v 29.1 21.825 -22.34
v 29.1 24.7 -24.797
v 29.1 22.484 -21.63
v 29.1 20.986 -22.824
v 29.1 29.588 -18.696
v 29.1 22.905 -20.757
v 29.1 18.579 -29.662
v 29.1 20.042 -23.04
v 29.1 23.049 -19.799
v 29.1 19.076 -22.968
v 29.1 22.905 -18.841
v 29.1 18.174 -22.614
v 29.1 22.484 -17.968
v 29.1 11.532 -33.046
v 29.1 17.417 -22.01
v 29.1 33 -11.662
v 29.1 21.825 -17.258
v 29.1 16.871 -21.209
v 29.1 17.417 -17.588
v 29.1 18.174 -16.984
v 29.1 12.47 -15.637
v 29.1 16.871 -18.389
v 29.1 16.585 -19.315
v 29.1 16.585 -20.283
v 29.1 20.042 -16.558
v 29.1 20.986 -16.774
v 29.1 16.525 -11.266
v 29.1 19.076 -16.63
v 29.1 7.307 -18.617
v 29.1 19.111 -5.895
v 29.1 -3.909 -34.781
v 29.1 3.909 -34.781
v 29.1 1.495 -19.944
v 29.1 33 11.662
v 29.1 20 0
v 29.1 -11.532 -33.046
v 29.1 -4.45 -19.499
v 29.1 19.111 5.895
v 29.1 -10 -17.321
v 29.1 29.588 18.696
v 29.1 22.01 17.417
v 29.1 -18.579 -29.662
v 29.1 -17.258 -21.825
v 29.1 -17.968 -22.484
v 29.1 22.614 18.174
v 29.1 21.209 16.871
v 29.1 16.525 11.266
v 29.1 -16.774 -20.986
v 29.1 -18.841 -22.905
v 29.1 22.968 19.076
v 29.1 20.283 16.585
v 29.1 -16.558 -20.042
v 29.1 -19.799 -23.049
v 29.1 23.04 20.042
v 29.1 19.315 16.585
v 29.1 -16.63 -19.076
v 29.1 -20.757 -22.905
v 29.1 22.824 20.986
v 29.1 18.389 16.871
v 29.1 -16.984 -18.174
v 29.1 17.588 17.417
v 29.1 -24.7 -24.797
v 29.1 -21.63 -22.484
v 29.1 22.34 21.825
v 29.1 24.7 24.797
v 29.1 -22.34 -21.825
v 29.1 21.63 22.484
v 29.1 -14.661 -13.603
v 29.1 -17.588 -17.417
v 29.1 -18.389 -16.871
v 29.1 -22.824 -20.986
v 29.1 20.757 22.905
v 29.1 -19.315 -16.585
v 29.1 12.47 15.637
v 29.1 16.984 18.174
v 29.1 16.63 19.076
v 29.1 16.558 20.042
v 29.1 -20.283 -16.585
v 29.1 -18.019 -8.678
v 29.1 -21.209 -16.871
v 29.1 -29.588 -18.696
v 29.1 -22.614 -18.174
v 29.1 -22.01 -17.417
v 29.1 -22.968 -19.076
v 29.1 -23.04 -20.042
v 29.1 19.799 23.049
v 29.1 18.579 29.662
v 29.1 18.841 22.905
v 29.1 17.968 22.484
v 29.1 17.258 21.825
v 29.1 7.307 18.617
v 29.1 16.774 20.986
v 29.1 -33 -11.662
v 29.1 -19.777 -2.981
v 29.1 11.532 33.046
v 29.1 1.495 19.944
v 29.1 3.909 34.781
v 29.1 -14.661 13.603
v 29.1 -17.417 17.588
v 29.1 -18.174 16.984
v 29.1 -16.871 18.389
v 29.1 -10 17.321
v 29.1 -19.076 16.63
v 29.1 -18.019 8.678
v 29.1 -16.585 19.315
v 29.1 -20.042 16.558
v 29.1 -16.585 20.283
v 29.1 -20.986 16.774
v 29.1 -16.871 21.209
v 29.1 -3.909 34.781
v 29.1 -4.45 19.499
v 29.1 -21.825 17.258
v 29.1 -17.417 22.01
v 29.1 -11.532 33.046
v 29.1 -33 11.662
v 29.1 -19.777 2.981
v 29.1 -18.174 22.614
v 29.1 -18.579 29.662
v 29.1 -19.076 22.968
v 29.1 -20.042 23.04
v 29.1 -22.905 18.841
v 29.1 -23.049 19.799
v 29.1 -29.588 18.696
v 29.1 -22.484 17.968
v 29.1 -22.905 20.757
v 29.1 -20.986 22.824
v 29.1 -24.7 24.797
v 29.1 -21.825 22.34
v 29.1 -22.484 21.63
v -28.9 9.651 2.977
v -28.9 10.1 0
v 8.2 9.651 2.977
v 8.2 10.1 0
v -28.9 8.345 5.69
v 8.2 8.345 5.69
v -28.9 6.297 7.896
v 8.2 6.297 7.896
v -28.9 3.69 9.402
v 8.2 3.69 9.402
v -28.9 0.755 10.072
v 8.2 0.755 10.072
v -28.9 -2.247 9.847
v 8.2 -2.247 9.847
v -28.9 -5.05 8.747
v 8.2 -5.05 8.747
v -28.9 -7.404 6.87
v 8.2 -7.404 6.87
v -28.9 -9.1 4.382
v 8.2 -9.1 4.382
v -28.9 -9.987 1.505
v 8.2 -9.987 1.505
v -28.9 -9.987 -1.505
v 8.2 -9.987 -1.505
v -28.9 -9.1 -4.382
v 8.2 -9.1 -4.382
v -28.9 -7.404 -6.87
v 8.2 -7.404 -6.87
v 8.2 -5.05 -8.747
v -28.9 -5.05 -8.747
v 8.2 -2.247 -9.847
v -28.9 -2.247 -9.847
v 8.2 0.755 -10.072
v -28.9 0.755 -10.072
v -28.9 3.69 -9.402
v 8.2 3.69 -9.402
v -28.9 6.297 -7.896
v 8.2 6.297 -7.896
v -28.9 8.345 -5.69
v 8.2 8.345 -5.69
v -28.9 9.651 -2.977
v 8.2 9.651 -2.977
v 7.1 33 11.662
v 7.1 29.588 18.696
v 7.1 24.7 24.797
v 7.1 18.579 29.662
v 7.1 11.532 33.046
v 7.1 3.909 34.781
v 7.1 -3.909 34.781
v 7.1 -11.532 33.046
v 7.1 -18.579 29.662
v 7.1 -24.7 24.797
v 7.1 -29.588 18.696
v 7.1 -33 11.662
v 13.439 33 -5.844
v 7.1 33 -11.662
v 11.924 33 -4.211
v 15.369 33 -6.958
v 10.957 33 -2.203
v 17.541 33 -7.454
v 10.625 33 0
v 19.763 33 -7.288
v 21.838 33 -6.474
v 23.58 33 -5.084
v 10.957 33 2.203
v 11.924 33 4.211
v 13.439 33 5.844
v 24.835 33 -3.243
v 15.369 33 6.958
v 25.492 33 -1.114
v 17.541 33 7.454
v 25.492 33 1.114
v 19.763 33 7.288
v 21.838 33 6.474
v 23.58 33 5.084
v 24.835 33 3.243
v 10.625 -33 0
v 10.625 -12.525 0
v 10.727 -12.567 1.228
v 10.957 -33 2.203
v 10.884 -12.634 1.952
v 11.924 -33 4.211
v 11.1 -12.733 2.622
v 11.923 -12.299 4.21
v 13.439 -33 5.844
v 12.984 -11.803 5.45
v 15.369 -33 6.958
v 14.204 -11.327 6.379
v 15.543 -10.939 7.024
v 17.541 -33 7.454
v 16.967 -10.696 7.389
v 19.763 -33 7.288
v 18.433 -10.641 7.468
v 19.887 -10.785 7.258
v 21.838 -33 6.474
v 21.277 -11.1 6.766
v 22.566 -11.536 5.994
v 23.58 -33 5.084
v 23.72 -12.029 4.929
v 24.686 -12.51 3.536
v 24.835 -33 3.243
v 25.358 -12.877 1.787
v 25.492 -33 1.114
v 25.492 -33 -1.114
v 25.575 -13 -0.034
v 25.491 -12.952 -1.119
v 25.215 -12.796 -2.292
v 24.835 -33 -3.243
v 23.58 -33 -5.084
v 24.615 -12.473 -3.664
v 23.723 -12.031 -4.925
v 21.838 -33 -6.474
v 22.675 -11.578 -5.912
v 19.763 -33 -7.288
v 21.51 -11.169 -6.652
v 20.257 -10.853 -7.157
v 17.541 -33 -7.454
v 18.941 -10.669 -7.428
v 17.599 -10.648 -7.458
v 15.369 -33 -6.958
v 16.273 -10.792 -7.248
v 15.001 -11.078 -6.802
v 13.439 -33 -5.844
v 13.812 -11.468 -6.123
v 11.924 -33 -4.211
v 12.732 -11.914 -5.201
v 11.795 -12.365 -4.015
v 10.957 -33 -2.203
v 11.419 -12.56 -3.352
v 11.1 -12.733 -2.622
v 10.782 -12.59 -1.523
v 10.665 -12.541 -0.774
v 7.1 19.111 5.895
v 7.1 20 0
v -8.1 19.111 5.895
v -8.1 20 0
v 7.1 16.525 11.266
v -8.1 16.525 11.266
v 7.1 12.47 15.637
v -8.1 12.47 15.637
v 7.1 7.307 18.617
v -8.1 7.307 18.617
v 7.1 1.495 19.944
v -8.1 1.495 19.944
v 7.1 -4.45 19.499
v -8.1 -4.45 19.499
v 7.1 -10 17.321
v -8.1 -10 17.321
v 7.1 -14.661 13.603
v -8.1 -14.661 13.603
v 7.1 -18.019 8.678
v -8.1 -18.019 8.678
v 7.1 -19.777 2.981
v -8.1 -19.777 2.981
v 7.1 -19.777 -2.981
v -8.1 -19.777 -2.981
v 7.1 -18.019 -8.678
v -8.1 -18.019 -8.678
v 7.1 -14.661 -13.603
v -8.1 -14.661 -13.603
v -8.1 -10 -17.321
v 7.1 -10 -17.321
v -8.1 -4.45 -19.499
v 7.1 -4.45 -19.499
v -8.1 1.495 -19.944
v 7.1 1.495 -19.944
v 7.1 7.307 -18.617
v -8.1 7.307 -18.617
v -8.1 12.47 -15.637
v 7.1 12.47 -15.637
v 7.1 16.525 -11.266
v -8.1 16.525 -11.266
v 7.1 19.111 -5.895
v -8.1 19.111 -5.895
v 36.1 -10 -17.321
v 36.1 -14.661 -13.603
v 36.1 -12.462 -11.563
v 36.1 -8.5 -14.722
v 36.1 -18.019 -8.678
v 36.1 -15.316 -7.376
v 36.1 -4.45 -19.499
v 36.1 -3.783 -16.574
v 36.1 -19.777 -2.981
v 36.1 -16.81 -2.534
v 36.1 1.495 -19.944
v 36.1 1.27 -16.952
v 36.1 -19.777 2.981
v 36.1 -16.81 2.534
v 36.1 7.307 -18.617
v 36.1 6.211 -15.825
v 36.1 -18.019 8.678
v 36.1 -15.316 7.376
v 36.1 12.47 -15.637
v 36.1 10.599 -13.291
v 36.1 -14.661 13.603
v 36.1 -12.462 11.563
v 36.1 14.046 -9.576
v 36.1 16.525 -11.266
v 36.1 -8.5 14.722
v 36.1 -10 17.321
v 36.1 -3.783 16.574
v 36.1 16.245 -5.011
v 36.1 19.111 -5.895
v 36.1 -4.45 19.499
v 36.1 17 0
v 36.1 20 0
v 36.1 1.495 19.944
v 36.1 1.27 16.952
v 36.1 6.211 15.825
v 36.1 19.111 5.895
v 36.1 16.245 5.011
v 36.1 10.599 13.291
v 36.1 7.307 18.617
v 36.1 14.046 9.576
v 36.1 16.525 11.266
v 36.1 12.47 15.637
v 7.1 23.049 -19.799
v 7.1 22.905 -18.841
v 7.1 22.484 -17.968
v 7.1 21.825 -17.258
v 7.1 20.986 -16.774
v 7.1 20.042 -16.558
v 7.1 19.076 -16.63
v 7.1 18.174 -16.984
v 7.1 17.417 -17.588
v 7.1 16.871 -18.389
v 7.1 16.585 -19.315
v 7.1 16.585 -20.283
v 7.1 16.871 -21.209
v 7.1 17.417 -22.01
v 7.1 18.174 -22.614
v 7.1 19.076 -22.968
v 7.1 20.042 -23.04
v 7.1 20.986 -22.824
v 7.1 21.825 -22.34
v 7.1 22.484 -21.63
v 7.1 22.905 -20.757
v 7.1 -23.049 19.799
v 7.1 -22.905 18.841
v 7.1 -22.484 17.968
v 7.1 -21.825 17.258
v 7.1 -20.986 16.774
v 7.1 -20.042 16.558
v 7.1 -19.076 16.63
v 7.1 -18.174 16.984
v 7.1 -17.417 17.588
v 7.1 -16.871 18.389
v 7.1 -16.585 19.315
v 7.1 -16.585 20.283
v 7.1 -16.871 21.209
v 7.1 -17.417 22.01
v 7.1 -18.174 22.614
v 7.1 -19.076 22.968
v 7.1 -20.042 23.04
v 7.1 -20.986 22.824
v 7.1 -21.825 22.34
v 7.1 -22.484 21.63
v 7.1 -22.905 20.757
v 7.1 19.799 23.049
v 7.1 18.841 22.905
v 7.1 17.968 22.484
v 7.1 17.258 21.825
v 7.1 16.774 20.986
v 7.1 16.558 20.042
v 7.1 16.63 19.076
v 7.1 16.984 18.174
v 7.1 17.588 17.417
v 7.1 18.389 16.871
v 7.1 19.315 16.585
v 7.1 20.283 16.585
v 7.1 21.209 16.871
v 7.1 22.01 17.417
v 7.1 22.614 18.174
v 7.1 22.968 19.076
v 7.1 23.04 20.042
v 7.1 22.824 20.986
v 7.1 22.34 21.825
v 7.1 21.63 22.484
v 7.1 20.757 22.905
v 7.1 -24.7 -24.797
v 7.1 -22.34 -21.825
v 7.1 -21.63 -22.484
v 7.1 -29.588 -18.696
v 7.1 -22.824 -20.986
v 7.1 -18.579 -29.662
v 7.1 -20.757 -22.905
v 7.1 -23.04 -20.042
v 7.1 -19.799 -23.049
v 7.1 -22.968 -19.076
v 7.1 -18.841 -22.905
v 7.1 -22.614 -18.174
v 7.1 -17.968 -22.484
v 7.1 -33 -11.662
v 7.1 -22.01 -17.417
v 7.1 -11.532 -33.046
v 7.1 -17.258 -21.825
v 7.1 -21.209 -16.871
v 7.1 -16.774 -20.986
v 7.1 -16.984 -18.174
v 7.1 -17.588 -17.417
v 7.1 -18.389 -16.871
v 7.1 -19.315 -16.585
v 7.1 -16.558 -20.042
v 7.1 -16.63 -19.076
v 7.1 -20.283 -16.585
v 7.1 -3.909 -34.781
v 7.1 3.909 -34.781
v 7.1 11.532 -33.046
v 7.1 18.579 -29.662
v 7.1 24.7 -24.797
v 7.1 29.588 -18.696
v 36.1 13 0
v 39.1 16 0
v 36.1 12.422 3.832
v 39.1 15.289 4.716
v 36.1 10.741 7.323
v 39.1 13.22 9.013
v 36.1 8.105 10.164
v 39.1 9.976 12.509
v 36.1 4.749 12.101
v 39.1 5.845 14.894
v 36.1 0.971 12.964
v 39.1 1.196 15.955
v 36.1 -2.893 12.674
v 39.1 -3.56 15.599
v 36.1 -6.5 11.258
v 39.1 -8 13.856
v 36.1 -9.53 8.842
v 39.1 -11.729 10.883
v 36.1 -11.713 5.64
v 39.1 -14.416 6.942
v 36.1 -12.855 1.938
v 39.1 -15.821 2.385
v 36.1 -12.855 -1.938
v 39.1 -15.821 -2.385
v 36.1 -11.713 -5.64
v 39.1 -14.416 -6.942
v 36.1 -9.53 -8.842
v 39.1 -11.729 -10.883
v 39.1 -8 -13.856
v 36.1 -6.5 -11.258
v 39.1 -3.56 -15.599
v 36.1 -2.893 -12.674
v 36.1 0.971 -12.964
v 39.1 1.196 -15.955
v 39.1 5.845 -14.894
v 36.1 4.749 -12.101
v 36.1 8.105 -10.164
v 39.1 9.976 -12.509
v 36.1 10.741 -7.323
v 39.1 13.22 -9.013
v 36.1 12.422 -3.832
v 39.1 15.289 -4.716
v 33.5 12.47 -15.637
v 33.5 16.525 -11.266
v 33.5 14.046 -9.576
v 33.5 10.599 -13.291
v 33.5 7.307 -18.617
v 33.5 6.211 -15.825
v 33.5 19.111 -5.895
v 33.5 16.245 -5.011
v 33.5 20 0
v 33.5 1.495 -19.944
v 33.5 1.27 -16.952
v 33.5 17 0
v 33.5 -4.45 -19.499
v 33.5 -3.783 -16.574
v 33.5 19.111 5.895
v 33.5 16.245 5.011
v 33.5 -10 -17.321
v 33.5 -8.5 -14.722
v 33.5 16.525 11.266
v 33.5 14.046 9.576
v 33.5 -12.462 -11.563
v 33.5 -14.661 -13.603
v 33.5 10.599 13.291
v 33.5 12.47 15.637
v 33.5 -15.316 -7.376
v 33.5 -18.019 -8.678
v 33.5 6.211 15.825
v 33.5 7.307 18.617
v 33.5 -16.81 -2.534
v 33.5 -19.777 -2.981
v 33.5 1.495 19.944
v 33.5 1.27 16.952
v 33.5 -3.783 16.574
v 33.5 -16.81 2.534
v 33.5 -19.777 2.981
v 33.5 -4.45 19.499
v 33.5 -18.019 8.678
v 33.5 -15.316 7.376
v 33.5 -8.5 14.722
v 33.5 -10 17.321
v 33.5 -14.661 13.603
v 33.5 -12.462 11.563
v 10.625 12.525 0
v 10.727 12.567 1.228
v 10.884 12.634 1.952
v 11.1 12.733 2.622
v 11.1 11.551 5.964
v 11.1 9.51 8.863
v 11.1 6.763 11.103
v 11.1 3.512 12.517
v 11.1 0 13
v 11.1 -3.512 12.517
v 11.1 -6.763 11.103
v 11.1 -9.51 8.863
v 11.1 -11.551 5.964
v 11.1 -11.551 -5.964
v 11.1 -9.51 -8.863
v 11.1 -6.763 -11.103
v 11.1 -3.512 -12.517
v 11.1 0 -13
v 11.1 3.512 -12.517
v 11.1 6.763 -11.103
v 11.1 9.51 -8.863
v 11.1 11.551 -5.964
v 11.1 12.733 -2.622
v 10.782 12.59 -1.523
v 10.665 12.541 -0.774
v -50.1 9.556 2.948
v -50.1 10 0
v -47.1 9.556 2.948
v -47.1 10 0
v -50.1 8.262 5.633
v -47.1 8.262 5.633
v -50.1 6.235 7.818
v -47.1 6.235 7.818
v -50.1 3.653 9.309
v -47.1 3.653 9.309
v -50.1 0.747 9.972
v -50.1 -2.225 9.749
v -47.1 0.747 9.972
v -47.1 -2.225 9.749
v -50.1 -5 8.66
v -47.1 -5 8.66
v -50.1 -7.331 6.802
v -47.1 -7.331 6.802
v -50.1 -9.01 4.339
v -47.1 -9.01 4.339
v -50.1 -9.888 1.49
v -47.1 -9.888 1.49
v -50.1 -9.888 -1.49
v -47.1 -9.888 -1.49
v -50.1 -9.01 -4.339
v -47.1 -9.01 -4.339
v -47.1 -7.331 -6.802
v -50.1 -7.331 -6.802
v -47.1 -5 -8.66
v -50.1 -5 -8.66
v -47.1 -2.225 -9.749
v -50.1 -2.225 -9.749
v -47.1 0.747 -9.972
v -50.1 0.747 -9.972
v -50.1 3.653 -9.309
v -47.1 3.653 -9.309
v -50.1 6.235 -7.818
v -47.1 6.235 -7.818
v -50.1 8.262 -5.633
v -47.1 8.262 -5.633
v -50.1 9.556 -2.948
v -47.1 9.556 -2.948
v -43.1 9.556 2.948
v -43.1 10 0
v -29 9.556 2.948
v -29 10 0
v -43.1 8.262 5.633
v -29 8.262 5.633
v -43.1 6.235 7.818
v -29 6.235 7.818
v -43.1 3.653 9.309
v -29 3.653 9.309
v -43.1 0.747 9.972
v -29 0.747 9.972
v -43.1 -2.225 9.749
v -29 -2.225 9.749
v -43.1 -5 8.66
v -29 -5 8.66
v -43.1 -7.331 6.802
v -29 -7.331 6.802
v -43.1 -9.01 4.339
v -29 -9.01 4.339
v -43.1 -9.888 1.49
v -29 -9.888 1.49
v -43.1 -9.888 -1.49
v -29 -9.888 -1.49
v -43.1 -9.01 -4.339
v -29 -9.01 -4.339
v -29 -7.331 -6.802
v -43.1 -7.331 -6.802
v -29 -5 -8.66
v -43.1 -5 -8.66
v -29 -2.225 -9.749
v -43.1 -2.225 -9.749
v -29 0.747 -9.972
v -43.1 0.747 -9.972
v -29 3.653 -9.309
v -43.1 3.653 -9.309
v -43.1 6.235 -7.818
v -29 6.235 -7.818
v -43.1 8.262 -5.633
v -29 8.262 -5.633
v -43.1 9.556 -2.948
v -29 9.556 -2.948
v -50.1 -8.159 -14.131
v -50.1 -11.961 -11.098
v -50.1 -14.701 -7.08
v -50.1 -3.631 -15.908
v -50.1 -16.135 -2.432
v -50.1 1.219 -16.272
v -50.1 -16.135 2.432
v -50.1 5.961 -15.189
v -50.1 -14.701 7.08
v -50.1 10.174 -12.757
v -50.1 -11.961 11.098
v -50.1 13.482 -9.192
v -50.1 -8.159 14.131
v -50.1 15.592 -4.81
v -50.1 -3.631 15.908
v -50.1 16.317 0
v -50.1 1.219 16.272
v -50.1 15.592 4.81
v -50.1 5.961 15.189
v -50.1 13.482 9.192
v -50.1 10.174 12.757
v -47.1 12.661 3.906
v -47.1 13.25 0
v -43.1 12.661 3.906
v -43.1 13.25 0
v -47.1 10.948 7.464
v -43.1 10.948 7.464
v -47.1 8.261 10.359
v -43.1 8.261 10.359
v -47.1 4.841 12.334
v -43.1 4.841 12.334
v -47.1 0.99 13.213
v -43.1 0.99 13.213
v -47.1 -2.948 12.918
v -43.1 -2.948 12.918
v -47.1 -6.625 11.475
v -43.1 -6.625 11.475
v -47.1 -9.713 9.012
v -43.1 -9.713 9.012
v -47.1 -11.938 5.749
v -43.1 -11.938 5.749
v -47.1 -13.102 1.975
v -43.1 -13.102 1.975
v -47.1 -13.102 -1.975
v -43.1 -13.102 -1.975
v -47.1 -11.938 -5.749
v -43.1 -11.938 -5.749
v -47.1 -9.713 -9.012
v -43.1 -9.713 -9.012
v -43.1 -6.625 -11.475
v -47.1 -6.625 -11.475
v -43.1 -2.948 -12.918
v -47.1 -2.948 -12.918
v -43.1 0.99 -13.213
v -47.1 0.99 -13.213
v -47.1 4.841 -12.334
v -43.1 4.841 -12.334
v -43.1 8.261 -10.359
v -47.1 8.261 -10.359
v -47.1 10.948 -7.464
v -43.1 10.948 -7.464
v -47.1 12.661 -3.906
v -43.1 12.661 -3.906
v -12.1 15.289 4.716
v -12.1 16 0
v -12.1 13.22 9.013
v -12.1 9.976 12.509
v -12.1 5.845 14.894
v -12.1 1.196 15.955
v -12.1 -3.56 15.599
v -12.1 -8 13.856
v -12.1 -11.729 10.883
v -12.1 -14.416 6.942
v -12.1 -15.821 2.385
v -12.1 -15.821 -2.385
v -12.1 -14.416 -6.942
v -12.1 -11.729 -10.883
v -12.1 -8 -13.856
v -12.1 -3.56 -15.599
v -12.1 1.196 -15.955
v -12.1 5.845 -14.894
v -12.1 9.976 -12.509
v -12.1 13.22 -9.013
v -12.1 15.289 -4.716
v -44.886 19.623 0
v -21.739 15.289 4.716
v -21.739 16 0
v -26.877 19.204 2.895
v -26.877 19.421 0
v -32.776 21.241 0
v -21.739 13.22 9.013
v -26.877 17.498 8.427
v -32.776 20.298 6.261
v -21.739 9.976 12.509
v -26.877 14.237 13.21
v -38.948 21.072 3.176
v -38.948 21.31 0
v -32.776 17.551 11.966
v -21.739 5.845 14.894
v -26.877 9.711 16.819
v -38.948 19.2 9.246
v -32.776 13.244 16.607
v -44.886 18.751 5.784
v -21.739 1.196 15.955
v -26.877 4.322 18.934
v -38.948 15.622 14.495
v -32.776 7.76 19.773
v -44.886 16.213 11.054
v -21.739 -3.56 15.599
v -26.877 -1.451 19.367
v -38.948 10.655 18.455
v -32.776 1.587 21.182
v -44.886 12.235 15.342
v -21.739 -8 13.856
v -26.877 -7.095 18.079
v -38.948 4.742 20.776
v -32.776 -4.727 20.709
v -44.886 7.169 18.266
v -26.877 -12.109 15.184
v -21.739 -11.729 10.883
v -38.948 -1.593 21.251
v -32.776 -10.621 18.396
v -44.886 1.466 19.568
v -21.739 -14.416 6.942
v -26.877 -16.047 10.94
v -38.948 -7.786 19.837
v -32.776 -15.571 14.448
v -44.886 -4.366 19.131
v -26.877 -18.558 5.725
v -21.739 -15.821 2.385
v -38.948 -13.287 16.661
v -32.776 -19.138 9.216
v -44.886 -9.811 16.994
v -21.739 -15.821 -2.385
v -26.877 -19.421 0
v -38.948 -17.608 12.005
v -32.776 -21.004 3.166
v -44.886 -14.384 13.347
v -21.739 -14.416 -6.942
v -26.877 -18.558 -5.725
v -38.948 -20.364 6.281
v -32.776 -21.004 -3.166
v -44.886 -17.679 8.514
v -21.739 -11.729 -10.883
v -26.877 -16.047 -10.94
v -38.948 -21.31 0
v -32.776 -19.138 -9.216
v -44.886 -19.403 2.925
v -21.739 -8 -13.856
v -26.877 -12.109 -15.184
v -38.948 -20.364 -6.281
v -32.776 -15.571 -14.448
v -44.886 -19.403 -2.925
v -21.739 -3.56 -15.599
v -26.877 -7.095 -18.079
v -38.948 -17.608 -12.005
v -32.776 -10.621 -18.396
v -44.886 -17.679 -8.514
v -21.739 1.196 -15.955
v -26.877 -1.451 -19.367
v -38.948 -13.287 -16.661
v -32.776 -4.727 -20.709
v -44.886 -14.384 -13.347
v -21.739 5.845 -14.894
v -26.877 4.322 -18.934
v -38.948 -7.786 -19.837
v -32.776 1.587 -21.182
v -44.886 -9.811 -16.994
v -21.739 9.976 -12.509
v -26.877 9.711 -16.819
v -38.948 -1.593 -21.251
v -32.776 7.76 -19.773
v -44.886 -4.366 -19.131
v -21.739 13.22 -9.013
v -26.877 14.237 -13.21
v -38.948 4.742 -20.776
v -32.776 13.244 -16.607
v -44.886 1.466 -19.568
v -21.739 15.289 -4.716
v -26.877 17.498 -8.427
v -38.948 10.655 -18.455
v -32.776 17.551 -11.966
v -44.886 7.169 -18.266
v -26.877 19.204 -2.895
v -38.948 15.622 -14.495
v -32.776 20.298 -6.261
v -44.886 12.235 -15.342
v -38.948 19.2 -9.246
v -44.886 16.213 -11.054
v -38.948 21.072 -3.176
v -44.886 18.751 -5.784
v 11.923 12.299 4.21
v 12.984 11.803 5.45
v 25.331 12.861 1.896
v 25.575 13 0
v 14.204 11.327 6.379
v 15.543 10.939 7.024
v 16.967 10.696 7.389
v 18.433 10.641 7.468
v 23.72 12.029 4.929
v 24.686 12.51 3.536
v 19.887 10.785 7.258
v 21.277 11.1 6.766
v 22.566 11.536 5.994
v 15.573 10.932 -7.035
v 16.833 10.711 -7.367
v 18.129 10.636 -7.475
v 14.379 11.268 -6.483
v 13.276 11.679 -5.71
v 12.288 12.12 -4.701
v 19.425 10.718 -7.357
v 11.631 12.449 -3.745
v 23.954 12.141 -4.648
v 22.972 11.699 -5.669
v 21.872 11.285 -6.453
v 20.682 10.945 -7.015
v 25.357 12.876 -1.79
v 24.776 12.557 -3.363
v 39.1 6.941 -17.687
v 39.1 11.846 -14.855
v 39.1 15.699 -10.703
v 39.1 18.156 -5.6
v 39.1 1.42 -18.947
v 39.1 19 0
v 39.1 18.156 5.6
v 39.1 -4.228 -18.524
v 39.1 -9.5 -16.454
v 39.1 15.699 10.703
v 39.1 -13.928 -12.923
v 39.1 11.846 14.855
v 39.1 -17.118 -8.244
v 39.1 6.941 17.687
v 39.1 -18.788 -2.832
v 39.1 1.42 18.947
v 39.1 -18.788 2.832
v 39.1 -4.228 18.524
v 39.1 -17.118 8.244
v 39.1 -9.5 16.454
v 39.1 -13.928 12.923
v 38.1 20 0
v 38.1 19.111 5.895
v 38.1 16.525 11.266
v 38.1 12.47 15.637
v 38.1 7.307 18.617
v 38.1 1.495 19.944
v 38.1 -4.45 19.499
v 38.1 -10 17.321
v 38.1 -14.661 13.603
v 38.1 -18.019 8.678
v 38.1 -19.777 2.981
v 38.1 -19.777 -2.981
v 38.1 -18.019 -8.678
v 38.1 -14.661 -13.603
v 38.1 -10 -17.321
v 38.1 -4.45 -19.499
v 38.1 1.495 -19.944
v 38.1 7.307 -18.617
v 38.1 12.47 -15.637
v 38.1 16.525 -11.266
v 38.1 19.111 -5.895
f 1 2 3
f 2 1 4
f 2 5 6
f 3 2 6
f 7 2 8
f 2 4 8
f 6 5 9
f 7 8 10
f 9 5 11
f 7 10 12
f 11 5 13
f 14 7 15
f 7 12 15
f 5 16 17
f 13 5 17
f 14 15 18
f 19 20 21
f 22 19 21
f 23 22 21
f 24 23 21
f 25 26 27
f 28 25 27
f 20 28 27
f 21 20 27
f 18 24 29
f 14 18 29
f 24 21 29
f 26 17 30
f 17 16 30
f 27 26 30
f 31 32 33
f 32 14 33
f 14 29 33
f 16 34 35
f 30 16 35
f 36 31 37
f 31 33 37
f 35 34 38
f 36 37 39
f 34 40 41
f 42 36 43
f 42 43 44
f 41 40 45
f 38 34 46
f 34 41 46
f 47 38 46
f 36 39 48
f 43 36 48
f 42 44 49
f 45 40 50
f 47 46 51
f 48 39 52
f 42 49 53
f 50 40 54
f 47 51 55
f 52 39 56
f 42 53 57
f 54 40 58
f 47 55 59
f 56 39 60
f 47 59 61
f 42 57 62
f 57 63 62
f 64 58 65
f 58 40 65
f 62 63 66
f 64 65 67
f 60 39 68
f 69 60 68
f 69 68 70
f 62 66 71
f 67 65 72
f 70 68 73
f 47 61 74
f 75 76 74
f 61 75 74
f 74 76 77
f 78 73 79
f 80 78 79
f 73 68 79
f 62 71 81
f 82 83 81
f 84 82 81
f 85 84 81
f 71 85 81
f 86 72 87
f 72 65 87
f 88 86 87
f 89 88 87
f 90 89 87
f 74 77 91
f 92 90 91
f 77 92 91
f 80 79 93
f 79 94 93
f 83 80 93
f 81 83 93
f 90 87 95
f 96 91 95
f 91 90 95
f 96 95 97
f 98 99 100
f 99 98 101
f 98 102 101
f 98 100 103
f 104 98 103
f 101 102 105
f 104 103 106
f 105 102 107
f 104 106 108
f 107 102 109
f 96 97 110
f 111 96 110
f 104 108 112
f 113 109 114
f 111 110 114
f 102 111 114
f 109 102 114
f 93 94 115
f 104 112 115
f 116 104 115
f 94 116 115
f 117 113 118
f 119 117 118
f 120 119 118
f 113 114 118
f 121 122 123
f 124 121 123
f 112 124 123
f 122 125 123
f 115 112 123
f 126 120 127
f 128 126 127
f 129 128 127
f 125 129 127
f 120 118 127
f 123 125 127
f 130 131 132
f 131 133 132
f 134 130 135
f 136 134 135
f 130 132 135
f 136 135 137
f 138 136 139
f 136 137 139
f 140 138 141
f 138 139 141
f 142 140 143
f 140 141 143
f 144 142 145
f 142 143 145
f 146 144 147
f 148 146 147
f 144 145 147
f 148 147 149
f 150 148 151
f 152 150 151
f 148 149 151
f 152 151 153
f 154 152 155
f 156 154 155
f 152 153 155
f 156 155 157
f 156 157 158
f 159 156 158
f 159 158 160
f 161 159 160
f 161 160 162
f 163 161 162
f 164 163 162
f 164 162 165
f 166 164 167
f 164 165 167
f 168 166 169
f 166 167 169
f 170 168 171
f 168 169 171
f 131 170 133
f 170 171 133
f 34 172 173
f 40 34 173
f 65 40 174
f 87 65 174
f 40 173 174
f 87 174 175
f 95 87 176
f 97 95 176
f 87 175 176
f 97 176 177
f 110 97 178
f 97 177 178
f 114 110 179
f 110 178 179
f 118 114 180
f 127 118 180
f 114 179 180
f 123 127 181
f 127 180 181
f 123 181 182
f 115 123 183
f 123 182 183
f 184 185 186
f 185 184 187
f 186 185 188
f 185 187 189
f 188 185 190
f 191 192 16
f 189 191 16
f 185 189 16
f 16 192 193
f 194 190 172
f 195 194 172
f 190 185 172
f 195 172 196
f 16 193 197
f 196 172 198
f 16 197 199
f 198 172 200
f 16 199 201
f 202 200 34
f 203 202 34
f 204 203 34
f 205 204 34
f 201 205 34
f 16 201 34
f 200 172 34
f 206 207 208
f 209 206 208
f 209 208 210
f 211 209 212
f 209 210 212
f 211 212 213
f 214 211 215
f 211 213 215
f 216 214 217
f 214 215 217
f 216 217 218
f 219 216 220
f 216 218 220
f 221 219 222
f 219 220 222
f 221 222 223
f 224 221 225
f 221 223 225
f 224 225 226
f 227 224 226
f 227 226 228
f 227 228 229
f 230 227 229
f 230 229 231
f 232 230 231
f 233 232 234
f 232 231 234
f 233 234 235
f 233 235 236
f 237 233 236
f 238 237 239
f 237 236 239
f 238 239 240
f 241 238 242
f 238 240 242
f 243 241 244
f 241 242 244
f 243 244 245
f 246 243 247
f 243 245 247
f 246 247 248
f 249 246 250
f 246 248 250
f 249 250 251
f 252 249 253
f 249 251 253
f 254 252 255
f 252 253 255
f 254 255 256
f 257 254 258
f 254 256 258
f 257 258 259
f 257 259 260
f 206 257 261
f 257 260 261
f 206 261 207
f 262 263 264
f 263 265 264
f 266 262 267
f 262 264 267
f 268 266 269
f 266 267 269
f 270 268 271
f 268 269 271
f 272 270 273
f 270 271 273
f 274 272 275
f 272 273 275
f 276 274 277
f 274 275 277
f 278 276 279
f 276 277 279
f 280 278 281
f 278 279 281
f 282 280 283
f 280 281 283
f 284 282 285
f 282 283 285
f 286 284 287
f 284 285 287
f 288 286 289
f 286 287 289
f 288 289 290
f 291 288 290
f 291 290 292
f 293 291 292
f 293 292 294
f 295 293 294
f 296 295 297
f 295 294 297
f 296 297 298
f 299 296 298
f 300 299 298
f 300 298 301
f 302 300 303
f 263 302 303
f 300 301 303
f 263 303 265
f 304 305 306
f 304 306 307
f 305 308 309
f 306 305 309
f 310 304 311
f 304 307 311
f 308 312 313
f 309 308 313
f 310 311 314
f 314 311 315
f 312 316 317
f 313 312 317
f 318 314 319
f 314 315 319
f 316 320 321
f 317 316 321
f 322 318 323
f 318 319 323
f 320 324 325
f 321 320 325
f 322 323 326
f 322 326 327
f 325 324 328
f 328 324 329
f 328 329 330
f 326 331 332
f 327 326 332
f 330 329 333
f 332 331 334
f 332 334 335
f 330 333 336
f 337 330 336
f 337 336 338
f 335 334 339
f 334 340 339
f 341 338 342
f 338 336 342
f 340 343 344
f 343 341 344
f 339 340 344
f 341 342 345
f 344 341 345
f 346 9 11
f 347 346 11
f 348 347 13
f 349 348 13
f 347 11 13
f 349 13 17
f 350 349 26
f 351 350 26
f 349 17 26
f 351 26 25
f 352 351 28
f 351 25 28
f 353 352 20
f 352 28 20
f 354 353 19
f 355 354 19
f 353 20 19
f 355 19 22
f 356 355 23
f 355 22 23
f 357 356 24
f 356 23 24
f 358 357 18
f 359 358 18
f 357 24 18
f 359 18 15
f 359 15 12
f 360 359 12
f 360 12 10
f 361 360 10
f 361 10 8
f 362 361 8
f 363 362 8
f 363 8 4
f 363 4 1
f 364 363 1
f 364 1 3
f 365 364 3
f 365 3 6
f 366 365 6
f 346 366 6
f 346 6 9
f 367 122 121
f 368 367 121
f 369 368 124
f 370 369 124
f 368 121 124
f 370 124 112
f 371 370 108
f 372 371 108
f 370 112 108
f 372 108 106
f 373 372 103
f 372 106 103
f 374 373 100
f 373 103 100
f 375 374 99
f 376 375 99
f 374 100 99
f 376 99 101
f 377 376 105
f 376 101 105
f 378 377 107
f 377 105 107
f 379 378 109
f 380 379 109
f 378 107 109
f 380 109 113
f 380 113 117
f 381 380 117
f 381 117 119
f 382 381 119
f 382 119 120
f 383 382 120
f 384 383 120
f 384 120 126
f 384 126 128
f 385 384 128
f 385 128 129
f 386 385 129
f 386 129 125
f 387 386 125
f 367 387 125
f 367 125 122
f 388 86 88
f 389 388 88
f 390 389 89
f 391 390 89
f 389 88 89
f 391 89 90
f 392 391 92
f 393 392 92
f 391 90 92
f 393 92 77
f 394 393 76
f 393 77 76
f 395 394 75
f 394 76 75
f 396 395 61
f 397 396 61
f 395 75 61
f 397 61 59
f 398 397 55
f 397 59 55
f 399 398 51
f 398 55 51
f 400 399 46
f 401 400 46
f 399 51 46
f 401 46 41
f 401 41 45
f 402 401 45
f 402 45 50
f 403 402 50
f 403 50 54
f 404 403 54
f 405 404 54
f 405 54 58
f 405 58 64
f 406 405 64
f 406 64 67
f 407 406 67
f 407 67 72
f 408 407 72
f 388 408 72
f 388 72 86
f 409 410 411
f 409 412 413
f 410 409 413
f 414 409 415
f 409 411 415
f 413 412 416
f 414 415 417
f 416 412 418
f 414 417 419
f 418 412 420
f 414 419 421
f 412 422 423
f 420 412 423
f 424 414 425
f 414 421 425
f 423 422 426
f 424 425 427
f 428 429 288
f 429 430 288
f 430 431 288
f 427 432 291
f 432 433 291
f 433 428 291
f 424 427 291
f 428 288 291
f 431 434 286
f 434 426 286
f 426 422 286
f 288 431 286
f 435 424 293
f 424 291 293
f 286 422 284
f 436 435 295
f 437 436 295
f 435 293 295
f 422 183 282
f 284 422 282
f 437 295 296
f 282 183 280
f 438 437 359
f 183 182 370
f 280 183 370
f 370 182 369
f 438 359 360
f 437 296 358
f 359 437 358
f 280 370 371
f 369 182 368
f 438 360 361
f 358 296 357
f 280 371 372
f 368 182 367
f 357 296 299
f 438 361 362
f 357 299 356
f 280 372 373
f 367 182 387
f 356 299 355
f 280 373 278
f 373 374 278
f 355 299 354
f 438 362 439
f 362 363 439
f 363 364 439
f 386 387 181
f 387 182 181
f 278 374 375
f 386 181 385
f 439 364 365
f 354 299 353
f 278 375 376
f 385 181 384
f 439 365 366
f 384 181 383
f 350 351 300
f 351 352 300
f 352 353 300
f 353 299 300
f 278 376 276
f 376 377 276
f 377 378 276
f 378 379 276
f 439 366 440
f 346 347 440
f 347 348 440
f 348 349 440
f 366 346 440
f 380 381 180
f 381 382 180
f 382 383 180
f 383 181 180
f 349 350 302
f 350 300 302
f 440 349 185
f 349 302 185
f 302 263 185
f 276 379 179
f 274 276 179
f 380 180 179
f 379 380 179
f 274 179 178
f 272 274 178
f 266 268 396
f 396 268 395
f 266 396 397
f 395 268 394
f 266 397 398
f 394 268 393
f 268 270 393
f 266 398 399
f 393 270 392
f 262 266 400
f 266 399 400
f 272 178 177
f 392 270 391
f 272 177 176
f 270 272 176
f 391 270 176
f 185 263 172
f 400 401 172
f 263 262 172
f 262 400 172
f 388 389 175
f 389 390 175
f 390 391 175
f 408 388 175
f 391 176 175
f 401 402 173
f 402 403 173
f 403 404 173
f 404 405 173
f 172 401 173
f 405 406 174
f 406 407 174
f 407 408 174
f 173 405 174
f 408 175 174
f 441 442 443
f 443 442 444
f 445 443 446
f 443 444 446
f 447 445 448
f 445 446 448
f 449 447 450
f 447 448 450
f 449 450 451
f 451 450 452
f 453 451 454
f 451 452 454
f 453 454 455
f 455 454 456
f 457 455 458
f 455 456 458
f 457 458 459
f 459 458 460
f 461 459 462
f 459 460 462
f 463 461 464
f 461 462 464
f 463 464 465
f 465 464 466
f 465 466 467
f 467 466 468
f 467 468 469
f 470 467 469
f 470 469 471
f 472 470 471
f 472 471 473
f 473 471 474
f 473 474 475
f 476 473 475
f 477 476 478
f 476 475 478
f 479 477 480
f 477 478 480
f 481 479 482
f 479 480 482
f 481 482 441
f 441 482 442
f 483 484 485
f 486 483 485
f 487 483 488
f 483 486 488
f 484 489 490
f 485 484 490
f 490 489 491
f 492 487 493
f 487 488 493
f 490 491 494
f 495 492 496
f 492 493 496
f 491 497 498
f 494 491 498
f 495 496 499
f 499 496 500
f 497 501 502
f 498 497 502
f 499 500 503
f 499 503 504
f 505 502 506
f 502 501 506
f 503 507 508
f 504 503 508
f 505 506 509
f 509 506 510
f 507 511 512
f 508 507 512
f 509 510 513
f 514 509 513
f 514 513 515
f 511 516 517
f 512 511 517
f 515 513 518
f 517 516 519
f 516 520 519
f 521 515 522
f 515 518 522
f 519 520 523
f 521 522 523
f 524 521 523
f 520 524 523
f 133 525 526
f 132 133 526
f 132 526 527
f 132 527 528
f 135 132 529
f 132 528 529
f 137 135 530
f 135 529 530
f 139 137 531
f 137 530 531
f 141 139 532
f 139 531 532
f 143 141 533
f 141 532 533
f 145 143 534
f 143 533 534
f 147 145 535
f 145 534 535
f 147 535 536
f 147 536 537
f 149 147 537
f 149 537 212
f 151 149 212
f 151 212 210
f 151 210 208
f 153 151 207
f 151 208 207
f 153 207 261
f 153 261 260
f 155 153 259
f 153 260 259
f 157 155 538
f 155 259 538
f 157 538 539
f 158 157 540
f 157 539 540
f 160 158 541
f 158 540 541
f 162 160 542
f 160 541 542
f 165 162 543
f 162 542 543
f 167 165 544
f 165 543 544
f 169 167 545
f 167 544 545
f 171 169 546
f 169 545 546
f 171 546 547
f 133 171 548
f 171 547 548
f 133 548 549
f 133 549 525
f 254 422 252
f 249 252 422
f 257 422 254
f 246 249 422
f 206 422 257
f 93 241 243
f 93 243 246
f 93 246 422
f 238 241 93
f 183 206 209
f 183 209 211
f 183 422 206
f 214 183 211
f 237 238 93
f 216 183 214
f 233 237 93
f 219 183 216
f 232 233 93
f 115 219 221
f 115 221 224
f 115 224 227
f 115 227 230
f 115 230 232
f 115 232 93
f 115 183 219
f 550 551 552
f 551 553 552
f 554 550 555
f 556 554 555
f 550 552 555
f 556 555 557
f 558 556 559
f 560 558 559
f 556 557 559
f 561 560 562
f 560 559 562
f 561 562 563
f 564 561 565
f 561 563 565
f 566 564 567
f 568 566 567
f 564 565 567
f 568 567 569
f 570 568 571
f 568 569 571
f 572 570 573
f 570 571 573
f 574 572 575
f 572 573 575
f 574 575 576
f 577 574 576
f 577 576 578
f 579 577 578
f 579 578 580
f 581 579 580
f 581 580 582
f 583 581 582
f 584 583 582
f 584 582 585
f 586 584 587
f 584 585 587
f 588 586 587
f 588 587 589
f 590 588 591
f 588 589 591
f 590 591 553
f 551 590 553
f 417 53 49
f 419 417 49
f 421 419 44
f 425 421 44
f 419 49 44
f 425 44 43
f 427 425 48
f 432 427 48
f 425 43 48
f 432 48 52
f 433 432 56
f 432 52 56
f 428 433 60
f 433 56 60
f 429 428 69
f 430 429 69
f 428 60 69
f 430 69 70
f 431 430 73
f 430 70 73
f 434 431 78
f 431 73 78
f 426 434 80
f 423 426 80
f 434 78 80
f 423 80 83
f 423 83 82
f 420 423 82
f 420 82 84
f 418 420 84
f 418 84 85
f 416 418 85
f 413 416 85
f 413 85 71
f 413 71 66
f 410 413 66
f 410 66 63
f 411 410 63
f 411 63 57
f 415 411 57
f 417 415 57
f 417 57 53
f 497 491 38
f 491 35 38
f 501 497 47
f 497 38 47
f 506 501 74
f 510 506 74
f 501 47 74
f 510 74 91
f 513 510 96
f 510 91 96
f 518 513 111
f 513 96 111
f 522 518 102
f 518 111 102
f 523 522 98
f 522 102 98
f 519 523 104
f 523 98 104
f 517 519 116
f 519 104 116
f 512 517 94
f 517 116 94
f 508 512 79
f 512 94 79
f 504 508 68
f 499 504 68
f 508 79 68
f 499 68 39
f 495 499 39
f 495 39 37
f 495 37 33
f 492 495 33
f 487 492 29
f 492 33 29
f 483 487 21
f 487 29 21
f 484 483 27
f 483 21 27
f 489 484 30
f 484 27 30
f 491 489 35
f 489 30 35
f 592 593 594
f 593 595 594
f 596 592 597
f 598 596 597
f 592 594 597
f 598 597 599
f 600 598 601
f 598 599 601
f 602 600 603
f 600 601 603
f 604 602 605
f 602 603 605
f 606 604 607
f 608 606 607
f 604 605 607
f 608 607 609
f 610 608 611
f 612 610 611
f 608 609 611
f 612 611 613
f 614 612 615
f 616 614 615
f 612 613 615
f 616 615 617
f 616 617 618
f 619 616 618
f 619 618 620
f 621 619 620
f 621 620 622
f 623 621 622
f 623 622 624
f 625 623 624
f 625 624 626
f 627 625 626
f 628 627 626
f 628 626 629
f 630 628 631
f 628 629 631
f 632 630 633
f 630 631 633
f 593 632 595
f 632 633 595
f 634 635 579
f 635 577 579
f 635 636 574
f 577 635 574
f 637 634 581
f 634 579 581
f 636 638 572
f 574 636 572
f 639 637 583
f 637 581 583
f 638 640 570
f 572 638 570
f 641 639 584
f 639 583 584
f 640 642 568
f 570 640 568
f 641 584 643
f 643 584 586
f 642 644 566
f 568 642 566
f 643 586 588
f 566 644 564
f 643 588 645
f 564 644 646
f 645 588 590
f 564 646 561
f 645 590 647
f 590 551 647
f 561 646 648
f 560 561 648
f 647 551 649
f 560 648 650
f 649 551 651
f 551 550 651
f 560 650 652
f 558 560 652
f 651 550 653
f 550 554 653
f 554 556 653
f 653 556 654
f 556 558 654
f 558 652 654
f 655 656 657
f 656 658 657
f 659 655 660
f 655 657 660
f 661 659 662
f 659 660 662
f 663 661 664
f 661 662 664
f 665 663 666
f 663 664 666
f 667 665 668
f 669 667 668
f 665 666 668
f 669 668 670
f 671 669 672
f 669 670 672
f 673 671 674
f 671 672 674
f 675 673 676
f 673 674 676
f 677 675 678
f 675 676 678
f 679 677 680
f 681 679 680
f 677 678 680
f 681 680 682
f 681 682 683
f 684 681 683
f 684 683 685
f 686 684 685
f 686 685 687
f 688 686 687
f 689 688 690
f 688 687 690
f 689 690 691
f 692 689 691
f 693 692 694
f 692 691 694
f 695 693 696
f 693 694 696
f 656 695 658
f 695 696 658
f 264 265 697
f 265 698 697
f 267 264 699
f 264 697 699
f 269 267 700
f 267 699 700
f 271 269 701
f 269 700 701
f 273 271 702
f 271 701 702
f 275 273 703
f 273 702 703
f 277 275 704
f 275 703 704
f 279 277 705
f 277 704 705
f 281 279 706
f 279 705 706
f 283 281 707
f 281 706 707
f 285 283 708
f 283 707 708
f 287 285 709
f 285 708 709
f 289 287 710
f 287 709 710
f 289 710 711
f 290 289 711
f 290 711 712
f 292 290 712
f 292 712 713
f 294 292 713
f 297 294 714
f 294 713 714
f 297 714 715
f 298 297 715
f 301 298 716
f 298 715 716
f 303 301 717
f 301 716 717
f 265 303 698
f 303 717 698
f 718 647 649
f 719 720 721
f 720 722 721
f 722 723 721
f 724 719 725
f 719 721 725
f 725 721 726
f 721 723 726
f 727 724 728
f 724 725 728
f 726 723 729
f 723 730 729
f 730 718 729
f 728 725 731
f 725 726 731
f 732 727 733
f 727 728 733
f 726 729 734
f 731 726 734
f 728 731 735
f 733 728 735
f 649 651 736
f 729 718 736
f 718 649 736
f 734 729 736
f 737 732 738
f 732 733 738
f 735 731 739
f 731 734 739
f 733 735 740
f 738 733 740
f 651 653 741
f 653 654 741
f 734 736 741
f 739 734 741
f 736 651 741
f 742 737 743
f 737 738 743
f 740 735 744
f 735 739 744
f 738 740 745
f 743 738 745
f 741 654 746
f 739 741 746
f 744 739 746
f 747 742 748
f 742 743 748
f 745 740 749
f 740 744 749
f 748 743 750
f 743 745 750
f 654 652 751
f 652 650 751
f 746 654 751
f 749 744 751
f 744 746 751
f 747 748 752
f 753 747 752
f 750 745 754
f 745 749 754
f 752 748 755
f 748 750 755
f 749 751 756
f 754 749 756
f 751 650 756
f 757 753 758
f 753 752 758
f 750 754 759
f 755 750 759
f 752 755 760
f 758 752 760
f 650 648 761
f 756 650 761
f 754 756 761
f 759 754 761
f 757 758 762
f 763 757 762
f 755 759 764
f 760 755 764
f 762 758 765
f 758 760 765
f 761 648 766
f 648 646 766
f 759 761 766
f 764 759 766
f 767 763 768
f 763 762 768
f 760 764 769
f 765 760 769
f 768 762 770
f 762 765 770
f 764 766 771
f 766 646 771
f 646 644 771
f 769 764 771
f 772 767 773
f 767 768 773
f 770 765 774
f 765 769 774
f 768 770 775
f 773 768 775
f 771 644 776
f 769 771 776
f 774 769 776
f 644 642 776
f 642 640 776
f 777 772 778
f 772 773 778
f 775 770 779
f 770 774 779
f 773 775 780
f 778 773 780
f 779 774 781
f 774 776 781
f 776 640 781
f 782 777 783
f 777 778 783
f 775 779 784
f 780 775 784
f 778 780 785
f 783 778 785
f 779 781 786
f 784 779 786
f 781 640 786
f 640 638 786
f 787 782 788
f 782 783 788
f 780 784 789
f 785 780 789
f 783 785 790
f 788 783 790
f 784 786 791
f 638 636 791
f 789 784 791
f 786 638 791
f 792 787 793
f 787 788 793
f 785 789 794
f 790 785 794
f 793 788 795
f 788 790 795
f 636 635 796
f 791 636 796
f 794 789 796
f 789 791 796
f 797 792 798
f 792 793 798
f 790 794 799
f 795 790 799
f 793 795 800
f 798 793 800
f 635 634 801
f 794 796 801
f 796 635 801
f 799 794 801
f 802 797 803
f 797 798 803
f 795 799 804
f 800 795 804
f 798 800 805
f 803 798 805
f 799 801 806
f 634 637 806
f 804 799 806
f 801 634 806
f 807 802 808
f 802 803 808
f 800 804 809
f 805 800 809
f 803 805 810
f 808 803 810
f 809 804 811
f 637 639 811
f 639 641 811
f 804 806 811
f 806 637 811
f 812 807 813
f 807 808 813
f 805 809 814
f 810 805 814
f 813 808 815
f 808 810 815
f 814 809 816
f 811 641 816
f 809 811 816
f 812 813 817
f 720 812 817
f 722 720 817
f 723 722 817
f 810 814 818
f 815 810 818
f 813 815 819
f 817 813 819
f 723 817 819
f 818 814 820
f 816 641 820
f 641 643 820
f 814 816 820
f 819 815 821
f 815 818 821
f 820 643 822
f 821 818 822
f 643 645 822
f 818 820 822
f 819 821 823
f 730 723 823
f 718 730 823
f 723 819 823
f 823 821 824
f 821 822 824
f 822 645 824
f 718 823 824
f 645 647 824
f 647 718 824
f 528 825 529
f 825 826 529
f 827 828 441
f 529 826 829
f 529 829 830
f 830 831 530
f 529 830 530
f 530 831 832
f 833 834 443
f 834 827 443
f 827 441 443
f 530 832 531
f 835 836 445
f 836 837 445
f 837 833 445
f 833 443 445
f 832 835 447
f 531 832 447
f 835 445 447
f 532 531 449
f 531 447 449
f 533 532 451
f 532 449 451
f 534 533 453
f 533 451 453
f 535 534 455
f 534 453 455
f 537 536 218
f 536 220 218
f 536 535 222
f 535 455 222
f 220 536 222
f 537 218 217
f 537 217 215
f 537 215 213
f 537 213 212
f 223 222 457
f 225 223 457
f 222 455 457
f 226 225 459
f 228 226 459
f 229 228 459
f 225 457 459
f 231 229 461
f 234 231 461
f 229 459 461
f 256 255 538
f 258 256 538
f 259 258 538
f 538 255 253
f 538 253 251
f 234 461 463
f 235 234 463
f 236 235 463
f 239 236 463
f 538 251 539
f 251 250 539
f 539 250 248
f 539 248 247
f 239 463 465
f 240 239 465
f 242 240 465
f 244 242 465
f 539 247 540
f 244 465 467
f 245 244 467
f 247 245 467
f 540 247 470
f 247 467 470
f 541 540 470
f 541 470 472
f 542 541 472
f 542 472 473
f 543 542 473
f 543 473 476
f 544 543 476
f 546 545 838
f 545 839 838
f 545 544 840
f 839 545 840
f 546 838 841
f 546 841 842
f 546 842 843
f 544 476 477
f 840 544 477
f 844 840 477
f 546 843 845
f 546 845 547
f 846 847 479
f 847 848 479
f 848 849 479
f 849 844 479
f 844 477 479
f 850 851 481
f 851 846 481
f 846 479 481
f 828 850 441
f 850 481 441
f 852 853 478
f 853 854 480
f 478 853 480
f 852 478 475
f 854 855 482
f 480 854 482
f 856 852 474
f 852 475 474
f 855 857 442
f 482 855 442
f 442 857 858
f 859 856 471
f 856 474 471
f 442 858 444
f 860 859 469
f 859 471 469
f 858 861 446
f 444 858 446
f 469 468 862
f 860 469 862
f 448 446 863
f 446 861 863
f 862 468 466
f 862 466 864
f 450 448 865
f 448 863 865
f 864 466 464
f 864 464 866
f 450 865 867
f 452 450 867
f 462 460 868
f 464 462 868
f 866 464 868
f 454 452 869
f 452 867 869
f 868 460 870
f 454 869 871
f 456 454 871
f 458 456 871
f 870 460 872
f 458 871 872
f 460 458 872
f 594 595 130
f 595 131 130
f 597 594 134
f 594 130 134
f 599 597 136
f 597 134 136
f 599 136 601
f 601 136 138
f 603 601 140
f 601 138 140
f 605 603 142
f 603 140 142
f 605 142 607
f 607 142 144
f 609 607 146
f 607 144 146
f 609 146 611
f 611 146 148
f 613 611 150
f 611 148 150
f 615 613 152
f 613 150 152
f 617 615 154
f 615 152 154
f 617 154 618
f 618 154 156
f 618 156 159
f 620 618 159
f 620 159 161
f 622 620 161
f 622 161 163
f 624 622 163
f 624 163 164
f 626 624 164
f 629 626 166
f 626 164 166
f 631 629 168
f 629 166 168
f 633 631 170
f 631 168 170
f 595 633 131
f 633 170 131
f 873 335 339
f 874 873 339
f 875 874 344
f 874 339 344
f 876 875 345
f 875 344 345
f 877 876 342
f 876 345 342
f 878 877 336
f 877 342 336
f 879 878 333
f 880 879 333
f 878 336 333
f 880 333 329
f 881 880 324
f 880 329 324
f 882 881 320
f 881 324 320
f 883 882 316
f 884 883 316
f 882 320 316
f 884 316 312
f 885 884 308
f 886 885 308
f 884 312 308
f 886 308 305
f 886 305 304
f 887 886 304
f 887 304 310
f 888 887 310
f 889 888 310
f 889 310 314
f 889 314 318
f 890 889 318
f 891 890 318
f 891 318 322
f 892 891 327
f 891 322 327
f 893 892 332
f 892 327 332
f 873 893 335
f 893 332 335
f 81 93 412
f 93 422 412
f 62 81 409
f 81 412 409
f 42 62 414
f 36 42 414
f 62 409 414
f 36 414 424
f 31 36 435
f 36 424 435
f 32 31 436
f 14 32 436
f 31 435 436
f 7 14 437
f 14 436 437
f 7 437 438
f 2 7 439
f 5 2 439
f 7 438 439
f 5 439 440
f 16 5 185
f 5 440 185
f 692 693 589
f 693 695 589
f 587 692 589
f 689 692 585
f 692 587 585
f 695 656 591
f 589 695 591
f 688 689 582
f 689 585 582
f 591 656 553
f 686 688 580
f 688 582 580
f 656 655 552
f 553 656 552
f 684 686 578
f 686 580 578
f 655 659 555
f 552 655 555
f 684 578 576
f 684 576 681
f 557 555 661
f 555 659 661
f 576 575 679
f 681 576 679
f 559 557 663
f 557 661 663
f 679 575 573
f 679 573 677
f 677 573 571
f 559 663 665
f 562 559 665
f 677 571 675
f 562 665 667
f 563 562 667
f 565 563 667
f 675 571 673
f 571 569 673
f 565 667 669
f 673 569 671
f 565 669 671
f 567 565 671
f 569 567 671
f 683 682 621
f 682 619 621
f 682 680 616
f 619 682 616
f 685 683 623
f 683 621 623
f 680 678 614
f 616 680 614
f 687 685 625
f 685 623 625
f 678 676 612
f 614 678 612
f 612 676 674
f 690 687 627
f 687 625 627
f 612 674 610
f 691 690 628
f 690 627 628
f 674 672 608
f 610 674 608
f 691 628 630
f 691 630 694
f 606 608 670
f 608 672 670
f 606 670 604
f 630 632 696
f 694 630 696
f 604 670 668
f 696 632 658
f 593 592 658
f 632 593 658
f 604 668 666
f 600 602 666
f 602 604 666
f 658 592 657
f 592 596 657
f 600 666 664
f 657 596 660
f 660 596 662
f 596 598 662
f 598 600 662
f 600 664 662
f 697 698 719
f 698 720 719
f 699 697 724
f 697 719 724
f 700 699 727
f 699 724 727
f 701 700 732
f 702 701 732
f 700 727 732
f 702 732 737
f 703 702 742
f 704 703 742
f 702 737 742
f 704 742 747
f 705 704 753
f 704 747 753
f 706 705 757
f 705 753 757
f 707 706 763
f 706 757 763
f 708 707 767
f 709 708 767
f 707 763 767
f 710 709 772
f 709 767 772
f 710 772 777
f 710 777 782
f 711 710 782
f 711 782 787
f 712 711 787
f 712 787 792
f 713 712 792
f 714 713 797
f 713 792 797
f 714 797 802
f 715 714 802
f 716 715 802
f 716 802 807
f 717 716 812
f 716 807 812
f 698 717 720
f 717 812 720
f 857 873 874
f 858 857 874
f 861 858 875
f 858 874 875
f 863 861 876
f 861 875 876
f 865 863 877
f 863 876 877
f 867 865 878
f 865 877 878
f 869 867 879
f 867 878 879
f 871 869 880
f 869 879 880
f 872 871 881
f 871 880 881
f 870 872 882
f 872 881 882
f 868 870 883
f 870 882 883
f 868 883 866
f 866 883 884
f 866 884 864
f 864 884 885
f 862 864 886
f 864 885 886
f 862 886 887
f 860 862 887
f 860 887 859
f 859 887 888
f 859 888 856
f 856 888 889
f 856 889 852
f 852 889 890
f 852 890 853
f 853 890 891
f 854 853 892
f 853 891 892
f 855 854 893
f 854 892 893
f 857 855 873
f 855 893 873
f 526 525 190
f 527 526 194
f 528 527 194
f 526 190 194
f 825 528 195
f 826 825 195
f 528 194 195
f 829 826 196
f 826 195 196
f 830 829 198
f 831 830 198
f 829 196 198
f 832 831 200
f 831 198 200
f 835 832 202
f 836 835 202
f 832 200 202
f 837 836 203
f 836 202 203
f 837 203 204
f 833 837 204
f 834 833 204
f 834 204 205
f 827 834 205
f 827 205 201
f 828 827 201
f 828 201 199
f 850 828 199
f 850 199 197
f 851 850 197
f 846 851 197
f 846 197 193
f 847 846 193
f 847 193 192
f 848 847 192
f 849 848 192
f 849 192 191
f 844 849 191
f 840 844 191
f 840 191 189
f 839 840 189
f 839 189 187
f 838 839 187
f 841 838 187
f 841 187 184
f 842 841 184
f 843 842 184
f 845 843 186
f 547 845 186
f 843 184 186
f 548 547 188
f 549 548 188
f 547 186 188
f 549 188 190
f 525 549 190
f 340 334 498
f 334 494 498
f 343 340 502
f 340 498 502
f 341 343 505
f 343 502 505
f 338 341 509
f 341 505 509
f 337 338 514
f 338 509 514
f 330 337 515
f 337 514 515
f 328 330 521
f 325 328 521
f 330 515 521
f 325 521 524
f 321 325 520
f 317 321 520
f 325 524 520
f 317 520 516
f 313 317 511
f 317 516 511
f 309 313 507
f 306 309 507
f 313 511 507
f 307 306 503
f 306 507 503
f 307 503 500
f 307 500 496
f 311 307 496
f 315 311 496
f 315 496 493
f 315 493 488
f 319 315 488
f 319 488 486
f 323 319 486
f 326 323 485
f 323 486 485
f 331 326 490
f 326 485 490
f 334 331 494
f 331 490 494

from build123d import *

# Parameters (mm, degrees)
ESQUISSE2_OUTSIDE_W          = 117.85
ESQUISSE2_OUTSIDE_H          = 98.65
ESQUISSE2_OUTSIDE_W_2        = 105
ESQUISSE2_OUTSIDE_H_2        = 66
ENL_V_MAT_EXTRU_1_DEPTH      = 50
ESQUISSE3_R                  = 7.475
ENL_V_MAT_EXTRU_2_DEPTH      = 67
ESQUISSE4_R                  = 3.25
ENL_V_MAT_EXTRU_3_DEPTH      = 80.2
R_P_TITION_CIRCULAIRE1_COUNT = 4
CHANFREIN1_SIZE              = 1


with BuildPart() as part:
    # Esquisse1 → Base-Révolution (revolve)
    with BuildSketch(Plane.XY):
        with BuildLine():
            Line((39.1, 16), (39.1, 20))
            Line((39.1, 20), (36.1, 20))
            Line((36.1, 20), (36.1, 17))
            Line((36.1, 17), (33.5, 17))
            Line((33.5, 17), (33.5, 20))
            Line((33.5, 20), (29.1, 20))
            Line((29.1, 20), (29.1, 35))
            Line((29.1, 35), (7.1, 35))
            Line((7.1, 35), (7.1, 20))
            Line((7.1, 20), (-8.1, 20))
            Line((-8.1, 20), (-12.1, 16))
            Line((-12.1, 16), (-21.738593384, 16))
            ThreePointArc((-21.738593384, 16), (-35.859578061, 21.498655709), (-50.1, 16.317168872))
            Line((-50.1, 16.317168872), (-50.1, 10))
            Line((-50.1, 10), (-47.1, 10))
            Line((-47.1, 10), (-47.1, 13.25))
            Line((-47.1, 13.25), (-43.1, 13.25))
            Line((-43.1, 13.25), (-43.1, 10))
            Line((-43.1, 10), (-29, 10))
            Line((-29, 10), (-28.9, 10.1))
            Line((-28.9, 10.1), (8.2, 10.1))
            Line((8.2, 10.1), (11.1, 13))
            Line((11.1, 13), (36.1, 13))
            Line((36.1, 13), (39.1, 16))
        make_face()
    revolve(axis=Axis((-69, 0, 0), (1, 0, 0)))

    # Esquisse2 outside → Enlèv. mat.-Extru.1 (cut, symmetric)
    with BuildSketch(Plane.XY):
        with Locations((-5.5, 0)):
            Rectangle(ESQUISSE2_OUTSIDE_W, ESQUISSE2_OUTSIDE_H)
        with Locations((-7.5, 0)):
            Rectangle(ESQUISSE2_OUTSIDE_W_2, ESQUISSE2_OUTSIDE_H_2, mode=Mode.SUBTRACT)
    extrude(amount=ENL_V_MAT_EXTRU_1_DEPTH, both=True, mode=Mode.SUBTRACT)

    # Esquisse3 → Enlèv. mat.-Extru.2 (cut, through all)
    with BuildSketch(Plane(origin=(0, 33, 0), x_dir=(-1, 0, 0), z_dir=(0, 1, 0))):
        with Locations((-18.1, 0)):
            Circle(ESQUISSE3_R)
    extrude(amount=-ENL_V_MAT_EXTRU_2_DEPTH, mode=Mode.SUBTRACT)

    # Esquisse4 → Enlèv. mat.-Extru.3 (cut, through all)
    with BuildSketch(Plane(origin=(29.1, 0, 0), x_dir=(0, 0, -1), z_dir=(1, 0, 0))):
        with Locations((19.798989873, -19.798989873)):
            Circle(ESQUISSE4_R)
    enl_v_mat_extru_3 = extrude(amount=-ENL_V_MAT_EXTRU_3_DEPTH, mode=Mode.SUBTRACT)

    # Répétition circulaire1: Enlèv. mat.-Extru.3 ×4 about axis
    r_p_tition_circulaire1_axis = Axis((-69, 0, 0), (1, 0, 0))
    for i in range(1, R_P_TITION_CIRCULAIRE1_COUNT):
        add(enl_v_mat_extru_3.rotate(r_p_tition_circulaire1_axis, i * 360 / R_P_TITION_CIRCULAIRE1_COUNT), mode=Mode.SUBTRACT)

    # Chanfrein1
    chanfrein1_edges = [part.edges().sort_by_distance(p)[0] for p in [
        (39.1, -20, 0),
    ]]
    chamfer(chanfrein1_edges, length=CHANFREIN1_SIZE)


solid = part.part
